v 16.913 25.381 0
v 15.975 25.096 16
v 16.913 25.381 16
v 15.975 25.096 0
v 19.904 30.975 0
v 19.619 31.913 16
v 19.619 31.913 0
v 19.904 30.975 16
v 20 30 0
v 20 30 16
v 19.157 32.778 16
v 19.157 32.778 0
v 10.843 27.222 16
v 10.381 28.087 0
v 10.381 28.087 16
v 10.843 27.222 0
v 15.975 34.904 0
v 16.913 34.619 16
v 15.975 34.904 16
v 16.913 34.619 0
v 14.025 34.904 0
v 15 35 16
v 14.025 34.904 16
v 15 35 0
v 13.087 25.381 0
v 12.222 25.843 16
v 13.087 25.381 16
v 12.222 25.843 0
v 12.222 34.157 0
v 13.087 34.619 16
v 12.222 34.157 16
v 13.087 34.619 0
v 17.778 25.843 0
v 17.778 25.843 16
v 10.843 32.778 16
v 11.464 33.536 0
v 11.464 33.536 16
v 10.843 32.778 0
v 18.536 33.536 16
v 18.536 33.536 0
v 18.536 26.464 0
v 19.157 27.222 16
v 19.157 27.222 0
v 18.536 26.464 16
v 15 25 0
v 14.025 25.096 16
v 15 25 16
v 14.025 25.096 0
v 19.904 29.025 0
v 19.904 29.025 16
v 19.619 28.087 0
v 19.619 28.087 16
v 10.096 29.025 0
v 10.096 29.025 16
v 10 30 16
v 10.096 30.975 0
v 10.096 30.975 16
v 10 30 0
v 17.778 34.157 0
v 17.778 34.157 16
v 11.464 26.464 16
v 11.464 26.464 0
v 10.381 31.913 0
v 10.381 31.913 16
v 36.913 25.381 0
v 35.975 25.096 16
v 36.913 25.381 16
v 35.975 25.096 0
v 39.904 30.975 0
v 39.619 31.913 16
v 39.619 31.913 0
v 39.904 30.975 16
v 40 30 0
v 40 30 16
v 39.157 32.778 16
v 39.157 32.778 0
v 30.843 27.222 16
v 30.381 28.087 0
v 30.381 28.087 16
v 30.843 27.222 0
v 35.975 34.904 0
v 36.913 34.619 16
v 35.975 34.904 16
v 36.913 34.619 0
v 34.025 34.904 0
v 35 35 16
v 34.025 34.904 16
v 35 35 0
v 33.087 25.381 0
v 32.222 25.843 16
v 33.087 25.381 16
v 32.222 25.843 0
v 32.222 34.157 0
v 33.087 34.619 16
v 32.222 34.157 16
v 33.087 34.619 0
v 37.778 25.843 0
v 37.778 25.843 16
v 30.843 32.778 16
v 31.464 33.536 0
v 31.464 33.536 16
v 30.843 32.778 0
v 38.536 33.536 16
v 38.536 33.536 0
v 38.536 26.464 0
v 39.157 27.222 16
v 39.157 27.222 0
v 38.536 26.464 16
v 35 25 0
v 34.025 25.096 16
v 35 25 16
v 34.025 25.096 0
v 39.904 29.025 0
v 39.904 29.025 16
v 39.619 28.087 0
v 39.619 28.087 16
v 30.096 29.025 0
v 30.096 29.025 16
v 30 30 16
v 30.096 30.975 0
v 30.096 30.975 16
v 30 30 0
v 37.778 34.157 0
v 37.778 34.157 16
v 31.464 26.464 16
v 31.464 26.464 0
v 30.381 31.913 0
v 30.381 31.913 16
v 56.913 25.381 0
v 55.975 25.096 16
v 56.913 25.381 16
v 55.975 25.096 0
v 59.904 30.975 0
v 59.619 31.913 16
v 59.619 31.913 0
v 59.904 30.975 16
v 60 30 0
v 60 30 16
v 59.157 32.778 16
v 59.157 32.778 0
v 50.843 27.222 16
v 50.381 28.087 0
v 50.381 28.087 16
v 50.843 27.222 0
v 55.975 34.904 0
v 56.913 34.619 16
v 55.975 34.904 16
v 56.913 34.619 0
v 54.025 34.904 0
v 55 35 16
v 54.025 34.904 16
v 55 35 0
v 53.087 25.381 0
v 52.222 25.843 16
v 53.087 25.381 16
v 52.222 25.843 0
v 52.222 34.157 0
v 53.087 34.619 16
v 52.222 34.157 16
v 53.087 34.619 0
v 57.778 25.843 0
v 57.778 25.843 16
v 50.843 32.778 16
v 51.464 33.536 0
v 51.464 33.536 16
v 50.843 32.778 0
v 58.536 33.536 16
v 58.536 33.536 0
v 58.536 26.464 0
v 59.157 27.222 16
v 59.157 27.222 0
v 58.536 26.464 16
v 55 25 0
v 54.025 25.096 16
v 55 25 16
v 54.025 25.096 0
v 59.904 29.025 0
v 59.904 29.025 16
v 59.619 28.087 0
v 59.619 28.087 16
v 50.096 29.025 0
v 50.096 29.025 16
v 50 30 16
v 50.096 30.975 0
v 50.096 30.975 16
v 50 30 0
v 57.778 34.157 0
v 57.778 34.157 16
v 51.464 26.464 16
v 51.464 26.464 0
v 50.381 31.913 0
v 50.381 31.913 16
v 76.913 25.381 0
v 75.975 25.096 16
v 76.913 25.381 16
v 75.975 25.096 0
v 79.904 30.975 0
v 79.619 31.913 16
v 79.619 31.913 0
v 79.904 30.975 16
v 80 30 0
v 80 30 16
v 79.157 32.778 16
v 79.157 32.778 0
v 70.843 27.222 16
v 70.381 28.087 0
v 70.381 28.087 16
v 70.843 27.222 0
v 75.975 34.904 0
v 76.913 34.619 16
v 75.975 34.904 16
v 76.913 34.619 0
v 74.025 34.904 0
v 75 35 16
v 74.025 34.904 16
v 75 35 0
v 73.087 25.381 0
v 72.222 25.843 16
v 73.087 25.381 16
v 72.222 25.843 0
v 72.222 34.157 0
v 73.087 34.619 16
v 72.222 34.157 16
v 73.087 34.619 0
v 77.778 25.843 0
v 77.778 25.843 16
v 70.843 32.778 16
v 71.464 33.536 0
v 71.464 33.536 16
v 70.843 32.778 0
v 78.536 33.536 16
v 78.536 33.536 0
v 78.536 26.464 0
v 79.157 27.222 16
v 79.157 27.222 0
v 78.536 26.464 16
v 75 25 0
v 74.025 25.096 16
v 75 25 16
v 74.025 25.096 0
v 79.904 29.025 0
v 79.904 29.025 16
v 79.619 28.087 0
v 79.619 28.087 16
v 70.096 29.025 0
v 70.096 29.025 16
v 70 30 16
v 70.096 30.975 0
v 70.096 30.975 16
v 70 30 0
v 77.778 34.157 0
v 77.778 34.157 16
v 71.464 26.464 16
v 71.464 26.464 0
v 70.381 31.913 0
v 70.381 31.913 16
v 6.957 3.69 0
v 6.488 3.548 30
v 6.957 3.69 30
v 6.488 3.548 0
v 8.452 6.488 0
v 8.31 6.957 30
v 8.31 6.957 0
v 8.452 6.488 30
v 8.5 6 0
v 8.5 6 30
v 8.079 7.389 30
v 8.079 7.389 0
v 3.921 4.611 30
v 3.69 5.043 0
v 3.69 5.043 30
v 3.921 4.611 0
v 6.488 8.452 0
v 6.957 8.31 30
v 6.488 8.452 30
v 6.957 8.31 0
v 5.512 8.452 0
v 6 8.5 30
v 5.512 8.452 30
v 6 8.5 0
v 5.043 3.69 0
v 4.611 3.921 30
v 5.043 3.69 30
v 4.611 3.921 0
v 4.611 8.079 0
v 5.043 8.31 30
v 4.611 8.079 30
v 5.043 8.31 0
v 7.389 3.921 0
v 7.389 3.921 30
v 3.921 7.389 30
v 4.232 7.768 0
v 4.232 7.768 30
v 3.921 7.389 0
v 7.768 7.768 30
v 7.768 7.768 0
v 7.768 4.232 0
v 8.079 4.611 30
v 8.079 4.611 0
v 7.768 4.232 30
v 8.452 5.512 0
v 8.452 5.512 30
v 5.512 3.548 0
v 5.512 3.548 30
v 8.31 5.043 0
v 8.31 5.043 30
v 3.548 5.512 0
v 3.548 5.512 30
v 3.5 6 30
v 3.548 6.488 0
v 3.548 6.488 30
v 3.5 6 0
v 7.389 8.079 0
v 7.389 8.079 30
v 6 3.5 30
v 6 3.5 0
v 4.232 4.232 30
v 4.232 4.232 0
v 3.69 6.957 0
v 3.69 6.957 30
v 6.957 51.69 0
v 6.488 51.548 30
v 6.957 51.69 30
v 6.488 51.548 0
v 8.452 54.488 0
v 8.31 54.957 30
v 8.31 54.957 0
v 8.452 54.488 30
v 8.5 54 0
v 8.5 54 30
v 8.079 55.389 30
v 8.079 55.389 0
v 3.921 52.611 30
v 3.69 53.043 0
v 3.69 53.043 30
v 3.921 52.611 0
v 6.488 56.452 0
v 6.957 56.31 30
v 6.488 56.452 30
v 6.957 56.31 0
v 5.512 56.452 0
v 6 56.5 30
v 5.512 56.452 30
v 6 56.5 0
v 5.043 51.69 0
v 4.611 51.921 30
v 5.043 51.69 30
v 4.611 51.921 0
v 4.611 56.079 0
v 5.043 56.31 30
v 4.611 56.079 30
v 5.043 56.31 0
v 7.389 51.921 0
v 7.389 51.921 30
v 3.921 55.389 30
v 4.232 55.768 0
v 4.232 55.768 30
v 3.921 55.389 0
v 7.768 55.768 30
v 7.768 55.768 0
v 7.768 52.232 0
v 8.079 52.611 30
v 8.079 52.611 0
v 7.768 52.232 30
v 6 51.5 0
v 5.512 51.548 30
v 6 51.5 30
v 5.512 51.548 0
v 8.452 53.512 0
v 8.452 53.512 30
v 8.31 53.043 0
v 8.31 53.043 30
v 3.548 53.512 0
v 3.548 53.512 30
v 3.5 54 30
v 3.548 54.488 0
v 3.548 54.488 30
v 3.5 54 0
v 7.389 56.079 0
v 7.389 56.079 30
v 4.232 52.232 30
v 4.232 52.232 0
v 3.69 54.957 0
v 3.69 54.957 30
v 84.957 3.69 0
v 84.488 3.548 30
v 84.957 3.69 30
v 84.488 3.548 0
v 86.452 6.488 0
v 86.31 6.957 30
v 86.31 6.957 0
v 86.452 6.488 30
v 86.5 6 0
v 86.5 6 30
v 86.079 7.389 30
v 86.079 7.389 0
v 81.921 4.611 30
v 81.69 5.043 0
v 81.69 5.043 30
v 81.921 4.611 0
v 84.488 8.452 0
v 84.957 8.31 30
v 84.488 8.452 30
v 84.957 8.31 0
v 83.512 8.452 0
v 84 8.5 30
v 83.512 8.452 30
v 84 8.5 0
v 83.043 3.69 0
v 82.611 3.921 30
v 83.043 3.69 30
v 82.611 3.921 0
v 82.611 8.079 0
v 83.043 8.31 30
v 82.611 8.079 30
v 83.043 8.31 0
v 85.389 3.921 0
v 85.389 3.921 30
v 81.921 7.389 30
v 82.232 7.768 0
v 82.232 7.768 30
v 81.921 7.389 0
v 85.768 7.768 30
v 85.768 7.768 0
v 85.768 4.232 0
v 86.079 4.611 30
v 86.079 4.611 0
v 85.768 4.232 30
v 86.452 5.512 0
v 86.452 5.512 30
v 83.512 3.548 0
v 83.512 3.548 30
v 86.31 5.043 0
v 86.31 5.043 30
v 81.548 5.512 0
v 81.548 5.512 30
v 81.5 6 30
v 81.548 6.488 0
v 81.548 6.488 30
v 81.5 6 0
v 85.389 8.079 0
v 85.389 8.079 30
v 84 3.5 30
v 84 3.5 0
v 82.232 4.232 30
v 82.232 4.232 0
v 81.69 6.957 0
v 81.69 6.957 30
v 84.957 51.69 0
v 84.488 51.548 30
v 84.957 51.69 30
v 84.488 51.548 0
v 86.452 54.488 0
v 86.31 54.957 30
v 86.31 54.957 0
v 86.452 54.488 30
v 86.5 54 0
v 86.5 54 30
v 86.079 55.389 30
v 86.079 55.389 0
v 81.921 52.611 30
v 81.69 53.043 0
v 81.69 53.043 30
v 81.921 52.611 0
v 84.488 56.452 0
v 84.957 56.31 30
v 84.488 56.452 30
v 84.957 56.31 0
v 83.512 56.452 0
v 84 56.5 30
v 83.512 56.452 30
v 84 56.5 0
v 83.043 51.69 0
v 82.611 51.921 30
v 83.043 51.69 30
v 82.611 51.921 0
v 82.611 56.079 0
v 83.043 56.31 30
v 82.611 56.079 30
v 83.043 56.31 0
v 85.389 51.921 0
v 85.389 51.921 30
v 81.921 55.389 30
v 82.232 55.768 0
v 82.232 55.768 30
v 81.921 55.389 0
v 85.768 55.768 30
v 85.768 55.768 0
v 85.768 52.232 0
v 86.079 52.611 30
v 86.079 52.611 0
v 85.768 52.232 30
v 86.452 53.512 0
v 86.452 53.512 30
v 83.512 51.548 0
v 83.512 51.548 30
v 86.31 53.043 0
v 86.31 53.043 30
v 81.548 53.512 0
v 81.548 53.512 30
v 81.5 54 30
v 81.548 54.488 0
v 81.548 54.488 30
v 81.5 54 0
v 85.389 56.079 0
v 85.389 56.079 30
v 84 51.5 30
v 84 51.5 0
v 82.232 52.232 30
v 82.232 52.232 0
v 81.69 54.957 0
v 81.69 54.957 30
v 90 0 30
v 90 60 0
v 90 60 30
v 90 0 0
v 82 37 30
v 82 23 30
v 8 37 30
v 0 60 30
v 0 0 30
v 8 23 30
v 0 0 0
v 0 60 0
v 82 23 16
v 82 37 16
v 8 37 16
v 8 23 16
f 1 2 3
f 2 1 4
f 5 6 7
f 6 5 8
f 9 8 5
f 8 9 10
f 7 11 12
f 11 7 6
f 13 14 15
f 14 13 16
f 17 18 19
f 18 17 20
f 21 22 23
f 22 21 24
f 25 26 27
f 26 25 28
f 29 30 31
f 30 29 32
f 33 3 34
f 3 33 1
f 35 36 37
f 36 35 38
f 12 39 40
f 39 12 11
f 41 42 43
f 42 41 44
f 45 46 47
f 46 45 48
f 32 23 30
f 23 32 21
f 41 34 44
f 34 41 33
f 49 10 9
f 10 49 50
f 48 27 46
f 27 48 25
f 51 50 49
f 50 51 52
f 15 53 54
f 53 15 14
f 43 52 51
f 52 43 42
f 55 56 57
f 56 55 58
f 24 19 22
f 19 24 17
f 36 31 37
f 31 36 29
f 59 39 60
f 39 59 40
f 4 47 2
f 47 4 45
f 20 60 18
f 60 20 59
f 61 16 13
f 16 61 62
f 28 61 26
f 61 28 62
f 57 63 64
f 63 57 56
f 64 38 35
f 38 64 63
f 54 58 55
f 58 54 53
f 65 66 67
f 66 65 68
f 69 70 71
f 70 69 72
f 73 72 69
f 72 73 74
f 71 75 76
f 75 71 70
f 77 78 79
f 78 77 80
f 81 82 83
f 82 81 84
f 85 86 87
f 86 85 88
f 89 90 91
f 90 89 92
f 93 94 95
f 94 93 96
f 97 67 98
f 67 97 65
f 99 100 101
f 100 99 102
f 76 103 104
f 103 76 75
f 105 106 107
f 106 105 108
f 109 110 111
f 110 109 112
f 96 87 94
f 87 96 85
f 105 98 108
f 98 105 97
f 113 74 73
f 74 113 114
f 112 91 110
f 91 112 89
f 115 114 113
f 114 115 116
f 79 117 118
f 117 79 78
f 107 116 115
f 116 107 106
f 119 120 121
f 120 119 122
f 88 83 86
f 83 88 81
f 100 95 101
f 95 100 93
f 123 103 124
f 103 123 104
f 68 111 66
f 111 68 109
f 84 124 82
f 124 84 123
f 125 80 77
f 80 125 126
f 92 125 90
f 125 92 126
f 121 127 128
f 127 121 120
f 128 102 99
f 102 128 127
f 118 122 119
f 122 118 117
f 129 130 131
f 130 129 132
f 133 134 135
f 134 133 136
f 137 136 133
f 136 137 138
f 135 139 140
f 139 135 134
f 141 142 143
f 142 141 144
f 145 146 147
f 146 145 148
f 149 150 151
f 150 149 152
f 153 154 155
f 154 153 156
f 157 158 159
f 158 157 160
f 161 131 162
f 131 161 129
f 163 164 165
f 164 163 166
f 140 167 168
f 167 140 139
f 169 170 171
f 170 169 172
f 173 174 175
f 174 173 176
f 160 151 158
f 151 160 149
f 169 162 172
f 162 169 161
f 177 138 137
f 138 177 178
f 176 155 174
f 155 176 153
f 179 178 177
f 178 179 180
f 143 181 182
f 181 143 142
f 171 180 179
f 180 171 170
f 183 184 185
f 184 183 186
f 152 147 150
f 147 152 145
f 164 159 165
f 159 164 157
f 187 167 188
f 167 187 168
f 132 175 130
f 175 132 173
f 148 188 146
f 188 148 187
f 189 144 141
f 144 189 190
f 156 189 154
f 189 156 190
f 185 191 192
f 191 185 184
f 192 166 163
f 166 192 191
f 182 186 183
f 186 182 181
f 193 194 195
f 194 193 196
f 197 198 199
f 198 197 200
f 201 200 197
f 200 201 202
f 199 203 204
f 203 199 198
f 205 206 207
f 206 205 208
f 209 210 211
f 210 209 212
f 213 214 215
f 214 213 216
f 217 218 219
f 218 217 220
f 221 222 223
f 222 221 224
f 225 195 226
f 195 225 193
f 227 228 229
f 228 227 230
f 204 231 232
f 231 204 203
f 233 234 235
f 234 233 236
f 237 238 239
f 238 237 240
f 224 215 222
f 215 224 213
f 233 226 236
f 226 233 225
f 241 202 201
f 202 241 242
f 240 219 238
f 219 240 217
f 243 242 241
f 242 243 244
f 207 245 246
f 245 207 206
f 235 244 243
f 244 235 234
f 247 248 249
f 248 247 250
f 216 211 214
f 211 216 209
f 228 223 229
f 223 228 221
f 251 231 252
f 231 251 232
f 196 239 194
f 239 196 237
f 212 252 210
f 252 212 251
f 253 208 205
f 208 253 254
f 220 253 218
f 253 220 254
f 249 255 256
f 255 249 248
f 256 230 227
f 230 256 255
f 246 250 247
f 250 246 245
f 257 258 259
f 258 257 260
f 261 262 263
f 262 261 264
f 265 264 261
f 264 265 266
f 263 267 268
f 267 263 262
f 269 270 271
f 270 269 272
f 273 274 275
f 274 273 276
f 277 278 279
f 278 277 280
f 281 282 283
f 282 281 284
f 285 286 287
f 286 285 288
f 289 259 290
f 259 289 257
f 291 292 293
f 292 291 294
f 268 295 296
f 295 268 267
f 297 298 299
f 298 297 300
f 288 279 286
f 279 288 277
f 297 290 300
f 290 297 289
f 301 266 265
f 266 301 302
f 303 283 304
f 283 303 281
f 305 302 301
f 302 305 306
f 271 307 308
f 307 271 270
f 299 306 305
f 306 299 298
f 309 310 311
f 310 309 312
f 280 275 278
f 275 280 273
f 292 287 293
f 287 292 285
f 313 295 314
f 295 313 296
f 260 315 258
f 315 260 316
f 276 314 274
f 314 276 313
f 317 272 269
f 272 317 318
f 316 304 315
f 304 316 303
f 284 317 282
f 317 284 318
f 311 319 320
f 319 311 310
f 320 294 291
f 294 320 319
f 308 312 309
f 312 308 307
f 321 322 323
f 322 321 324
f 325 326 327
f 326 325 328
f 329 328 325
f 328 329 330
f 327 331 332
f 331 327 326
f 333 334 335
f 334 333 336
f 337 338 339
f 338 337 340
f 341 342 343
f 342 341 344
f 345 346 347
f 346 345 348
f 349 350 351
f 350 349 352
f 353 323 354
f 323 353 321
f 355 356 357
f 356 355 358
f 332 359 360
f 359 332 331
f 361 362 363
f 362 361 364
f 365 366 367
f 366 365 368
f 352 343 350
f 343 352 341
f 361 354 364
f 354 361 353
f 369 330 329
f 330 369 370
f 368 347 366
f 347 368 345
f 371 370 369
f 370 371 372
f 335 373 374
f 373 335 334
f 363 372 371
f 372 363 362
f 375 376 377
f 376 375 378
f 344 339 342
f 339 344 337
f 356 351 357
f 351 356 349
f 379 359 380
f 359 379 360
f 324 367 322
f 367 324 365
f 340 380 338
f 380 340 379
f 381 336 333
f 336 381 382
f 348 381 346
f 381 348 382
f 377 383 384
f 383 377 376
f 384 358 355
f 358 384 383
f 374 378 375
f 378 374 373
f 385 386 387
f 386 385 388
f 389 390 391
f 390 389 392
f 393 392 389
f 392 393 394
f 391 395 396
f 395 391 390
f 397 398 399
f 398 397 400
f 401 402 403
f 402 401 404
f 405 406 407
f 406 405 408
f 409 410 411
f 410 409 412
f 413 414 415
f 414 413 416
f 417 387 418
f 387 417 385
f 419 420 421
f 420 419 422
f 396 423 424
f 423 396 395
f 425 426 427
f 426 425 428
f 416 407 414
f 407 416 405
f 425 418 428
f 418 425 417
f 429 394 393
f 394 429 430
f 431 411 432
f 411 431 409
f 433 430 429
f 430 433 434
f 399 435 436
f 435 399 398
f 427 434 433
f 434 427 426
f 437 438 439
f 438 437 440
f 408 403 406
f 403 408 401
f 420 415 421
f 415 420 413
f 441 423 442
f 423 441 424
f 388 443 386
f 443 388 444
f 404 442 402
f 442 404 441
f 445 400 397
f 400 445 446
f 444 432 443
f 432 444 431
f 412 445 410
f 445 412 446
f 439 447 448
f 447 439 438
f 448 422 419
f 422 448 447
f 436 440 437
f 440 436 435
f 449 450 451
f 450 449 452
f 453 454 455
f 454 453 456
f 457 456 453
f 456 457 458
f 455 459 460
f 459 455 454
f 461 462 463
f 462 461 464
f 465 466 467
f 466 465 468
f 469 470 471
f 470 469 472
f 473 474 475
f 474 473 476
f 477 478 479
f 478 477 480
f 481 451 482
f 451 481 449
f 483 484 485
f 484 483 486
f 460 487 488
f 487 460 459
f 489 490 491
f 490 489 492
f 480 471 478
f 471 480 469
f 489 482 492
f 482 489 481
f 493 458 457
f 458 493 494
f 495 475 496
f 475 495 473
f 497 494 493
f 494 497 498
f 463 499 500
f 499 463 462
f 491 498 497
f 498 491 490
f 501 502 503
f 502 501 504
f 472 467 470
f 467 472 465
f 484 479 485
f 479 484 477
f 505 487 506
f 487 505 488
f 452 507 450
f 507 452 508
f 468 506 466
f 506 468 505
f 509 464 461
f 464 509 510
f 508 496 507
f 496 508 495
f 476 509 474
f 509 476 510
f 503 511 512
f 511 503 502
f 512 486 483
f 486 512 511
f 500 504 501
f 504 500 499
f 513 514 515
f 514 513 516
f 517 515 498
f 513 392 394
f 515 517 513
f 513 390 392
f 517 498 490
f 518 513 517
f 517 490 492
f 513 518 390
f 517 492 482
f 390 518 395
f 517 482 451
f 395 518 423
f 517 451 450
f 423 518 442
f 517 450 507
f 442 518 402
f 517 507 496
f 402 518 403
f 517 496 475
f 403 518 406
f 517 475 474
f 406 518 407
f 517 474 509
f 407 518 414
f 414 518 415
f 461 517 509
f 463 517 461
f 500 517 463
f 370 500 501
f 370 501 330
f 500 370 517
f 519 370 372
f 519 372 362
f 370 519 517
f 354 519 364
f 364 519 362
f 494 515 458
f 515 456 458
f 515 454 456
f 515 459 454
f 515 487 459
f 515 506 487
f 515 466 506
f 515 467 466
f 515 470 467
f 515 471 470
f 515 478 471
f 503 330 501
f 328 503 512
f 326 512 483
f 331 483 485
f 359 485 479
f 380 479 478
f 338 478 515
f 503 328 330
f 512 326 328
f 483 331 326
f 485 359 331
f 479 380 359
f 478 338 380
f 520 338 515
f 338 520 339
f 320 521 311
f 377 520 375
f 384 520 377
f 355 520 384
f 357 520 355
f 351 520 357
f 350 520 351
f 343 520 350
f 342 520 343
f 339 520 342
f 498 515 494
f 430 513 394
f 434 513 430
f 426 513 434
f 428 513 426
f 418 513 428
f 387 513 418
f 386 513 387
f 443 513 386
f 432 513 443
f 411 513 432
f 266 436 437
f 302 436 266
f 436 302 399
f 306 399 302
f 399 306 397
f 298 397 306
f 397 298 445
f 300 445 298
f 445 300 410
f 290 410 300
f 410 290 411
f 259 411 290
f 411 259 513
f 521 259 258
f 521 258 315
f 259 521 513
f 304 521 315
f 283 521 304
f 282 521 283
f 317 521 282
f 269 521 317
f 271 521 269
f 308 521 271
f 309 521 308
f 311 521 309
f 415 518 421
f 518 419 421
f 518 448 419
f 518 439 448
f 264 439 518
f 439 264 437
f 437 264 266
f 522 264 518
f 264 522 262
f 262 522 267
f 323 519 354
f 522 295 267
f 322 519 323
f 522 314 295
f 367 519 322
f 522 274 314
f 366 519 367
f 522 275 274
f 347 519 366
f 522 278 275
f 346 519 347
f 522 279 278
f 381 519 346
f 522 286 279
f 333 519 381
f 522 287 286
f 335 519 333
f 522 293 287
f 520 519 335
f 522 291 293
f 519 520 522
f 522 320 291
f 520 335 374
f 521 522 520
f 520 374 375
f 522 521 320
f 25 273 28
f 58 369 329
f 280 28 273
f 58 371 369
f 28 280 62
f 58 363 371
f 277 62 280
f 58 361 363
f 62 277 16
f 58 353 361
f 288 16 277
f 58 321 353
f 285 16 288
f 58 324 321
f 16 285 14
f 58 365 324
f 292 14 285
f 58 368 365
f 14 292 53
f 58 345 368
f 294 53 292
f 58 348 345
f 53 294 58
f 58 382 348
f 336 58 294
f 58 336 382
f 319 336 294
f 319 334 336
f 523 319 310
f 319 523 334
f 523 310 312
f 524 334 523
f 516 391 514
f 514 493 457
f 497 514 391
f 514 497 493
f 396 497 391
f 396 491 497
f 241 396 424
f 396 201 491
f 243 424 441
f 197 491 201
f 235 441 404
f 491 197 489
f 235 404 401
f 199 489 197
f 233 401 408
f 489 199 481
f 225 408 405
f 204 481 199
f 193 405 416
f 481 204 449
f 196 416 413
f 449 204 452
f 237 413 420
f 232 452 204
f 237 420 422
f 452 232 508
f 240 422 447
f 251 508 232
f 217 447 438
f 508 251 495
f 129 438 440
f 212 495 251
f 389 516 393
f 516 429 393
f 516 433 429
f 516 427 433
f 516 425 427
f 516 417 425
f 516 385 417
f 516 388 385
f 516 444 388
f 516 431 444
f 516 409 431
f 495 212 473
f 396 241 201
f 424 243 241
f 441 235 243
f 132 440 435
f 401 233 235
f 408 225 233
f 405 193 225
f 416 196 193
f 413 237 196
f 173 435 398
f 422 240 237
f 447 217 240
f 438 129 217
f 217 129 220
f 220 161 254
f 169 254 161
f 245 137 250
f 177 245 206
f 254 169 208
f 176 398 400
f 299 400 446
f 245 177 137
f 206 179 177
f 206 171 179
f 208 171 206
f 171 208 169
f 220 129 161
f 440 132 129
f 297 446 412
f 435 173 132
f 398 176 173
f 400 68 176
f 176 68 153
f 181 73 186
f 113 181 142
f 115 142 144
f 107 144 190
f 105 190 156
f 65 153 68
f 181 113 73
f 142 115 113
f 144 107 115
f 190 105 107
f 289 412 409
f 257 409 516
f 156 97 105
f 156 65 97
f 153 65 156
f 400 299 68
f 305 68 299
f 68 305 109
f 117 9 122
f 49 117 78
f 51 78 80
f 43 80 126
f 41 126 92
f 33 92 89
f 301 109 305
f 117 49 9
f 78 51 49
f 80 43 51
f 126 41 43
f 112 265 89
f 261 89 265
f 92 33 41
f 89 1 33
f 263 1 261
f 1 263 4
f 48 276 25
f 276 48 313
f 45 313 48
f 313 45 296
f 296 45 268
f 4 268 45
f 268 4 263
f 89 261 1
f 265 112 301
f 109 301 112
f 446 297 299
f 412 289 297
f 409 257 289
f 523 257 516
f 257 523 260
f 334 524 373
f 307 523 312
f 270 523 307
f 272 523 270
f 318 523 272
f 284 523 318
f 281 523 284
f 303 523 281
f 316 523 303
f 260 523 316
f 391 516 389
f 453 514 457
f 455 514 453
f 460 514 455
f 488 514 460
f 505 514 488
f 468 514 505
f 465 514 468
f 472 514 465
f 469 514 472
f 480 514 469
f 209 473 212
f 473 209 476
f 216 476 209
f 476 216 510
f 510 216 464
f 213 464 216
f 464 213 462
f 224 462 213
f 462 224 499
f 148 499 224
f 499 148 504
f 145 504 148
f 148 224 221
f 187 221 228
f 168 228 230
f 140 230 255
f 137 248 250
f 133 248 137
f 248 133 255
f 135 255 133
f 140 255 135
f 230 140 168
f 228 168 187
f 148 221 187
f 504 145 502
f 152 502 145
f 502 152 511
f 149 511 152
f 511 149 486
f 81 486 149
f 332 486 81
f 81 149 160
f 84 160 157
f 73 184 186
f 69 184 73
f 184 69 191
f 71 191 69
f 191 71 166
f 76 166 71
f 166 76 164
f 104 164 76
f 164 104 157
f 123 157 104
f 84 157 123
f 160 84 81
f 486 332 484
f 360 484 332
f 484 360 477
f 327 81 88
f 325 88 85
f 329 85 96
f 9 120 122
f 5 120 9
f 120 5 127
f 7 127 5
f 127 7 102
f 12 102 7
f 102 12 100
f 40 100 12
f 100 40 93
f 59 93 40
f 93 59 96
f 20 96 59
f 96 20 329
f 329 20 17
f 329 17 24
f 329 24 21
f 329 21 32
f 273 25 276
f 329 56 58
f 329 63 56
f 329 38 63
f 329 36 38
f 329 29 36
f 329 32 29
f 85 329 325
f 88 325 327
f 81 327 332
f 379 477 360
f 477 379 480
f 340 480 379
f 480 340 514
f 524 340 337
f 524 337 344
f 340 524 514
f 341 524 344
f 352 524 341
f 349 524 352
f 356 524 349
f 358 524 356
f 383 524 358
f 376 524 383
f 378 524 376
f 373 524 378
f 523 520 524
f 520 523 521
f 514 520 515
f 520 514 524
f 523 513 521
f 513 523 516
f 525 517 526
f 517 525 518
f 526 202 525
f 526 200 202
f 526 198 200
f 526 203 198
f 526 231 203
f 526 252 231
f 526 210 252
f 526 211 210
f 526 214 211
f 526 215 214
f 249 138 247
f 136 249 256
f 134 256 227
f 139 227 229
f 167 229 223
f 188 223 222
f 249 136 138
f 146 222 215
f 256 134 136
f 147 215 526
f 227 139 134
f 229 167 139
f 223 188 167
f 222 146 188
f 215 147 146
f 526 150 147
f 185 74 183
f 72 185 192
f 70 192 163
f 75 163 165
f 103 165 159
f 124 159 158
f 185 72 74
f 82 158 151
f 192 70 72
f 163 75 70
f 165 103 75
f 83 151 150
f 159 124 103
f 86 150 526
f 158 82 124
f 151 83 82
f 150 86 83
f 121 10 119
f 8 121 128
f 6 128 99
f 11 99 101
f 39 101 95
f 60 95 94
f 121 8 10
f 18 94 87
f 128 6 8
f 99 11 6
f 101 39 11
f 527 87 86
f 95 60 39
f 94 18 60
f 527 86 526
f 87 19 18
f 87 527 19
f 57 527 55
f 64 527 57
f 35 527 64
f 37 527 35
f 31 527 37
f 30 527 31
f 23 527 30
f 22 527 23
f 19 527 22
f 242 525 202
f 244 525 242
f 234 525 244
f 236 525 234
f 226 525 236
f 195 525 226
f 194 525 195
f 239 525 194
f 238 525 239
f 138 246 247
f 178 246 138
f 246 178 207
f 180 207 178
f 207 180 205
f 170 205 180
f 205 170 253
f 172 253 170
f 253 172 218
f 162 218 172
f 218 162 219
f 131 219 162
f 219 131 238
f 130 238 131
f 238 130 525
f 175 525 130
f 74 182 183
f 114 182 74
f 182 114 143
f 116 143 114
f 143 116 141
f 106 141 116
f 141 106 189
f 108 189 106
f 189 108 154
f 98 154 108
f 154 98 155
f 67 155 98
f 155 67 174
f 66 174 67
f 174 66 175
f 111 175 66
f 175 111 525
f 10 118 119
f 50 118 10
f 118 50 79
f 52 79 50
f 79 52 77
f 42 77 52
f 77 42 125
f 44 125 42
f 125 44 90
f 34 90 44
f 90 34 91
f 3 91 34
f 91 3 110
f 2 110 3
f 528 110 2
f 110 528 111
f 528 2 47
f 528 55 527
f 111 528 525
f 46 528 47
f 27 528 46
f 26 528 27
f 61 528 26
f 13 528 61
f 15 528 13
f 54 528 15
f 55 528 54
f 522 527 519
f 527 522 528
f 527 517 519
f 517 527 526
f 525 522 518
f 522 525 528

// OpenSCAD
$fn = 32;

// ----------------------------------------------------------------------
// Manifold block: gallery_top manifold
// ----------------------------------------------------------------------

// --- parameters (mm) ---
block_l = 90;             // block length, X
block_w = 60;             // block width, Y
block_h = 30;             // block height, Z
port_d = 10;              // port bore diameter
port_pitch = 20;          // port pitch along X
gallery_d = 14;           // top gallery width, Y
gallery_depth = 14;       // gallery pocket depth
wall_p = 8;               // gallery end wall thickness, X
mnt_d = 5;                // mounting hole diameter
mnt_in = 6;               // mounting hole inset from the edges

n_ports = 4;  // ports in the row
port_x0 = (block_l - (n_ports - 1) * port_pitch) / 2;  // first port X

difference() {
  cube([block_l, block_w, block_h]);
  for (i = [0 : n_ports - 1])
    translate([port_x0 + i * port_pitch, block_w / 2, -1])
      cylinder(h = block_h + 2, d = port_d);
  translate([wall_p, block_w / 2 - gallery_d / 2, block_h - gallery_depth])
    cube([block_l - 2 * wall_p, gallery_d, gallery_depth + 1]);
  for (cx = [mnt_in, block_l - mnt_in])
    for (cy = [mnt_in, block_w - mnt_in])
      translate([cx, cy, -1]) cylinder(h = block_h + 2, d = mnt_d);
}
